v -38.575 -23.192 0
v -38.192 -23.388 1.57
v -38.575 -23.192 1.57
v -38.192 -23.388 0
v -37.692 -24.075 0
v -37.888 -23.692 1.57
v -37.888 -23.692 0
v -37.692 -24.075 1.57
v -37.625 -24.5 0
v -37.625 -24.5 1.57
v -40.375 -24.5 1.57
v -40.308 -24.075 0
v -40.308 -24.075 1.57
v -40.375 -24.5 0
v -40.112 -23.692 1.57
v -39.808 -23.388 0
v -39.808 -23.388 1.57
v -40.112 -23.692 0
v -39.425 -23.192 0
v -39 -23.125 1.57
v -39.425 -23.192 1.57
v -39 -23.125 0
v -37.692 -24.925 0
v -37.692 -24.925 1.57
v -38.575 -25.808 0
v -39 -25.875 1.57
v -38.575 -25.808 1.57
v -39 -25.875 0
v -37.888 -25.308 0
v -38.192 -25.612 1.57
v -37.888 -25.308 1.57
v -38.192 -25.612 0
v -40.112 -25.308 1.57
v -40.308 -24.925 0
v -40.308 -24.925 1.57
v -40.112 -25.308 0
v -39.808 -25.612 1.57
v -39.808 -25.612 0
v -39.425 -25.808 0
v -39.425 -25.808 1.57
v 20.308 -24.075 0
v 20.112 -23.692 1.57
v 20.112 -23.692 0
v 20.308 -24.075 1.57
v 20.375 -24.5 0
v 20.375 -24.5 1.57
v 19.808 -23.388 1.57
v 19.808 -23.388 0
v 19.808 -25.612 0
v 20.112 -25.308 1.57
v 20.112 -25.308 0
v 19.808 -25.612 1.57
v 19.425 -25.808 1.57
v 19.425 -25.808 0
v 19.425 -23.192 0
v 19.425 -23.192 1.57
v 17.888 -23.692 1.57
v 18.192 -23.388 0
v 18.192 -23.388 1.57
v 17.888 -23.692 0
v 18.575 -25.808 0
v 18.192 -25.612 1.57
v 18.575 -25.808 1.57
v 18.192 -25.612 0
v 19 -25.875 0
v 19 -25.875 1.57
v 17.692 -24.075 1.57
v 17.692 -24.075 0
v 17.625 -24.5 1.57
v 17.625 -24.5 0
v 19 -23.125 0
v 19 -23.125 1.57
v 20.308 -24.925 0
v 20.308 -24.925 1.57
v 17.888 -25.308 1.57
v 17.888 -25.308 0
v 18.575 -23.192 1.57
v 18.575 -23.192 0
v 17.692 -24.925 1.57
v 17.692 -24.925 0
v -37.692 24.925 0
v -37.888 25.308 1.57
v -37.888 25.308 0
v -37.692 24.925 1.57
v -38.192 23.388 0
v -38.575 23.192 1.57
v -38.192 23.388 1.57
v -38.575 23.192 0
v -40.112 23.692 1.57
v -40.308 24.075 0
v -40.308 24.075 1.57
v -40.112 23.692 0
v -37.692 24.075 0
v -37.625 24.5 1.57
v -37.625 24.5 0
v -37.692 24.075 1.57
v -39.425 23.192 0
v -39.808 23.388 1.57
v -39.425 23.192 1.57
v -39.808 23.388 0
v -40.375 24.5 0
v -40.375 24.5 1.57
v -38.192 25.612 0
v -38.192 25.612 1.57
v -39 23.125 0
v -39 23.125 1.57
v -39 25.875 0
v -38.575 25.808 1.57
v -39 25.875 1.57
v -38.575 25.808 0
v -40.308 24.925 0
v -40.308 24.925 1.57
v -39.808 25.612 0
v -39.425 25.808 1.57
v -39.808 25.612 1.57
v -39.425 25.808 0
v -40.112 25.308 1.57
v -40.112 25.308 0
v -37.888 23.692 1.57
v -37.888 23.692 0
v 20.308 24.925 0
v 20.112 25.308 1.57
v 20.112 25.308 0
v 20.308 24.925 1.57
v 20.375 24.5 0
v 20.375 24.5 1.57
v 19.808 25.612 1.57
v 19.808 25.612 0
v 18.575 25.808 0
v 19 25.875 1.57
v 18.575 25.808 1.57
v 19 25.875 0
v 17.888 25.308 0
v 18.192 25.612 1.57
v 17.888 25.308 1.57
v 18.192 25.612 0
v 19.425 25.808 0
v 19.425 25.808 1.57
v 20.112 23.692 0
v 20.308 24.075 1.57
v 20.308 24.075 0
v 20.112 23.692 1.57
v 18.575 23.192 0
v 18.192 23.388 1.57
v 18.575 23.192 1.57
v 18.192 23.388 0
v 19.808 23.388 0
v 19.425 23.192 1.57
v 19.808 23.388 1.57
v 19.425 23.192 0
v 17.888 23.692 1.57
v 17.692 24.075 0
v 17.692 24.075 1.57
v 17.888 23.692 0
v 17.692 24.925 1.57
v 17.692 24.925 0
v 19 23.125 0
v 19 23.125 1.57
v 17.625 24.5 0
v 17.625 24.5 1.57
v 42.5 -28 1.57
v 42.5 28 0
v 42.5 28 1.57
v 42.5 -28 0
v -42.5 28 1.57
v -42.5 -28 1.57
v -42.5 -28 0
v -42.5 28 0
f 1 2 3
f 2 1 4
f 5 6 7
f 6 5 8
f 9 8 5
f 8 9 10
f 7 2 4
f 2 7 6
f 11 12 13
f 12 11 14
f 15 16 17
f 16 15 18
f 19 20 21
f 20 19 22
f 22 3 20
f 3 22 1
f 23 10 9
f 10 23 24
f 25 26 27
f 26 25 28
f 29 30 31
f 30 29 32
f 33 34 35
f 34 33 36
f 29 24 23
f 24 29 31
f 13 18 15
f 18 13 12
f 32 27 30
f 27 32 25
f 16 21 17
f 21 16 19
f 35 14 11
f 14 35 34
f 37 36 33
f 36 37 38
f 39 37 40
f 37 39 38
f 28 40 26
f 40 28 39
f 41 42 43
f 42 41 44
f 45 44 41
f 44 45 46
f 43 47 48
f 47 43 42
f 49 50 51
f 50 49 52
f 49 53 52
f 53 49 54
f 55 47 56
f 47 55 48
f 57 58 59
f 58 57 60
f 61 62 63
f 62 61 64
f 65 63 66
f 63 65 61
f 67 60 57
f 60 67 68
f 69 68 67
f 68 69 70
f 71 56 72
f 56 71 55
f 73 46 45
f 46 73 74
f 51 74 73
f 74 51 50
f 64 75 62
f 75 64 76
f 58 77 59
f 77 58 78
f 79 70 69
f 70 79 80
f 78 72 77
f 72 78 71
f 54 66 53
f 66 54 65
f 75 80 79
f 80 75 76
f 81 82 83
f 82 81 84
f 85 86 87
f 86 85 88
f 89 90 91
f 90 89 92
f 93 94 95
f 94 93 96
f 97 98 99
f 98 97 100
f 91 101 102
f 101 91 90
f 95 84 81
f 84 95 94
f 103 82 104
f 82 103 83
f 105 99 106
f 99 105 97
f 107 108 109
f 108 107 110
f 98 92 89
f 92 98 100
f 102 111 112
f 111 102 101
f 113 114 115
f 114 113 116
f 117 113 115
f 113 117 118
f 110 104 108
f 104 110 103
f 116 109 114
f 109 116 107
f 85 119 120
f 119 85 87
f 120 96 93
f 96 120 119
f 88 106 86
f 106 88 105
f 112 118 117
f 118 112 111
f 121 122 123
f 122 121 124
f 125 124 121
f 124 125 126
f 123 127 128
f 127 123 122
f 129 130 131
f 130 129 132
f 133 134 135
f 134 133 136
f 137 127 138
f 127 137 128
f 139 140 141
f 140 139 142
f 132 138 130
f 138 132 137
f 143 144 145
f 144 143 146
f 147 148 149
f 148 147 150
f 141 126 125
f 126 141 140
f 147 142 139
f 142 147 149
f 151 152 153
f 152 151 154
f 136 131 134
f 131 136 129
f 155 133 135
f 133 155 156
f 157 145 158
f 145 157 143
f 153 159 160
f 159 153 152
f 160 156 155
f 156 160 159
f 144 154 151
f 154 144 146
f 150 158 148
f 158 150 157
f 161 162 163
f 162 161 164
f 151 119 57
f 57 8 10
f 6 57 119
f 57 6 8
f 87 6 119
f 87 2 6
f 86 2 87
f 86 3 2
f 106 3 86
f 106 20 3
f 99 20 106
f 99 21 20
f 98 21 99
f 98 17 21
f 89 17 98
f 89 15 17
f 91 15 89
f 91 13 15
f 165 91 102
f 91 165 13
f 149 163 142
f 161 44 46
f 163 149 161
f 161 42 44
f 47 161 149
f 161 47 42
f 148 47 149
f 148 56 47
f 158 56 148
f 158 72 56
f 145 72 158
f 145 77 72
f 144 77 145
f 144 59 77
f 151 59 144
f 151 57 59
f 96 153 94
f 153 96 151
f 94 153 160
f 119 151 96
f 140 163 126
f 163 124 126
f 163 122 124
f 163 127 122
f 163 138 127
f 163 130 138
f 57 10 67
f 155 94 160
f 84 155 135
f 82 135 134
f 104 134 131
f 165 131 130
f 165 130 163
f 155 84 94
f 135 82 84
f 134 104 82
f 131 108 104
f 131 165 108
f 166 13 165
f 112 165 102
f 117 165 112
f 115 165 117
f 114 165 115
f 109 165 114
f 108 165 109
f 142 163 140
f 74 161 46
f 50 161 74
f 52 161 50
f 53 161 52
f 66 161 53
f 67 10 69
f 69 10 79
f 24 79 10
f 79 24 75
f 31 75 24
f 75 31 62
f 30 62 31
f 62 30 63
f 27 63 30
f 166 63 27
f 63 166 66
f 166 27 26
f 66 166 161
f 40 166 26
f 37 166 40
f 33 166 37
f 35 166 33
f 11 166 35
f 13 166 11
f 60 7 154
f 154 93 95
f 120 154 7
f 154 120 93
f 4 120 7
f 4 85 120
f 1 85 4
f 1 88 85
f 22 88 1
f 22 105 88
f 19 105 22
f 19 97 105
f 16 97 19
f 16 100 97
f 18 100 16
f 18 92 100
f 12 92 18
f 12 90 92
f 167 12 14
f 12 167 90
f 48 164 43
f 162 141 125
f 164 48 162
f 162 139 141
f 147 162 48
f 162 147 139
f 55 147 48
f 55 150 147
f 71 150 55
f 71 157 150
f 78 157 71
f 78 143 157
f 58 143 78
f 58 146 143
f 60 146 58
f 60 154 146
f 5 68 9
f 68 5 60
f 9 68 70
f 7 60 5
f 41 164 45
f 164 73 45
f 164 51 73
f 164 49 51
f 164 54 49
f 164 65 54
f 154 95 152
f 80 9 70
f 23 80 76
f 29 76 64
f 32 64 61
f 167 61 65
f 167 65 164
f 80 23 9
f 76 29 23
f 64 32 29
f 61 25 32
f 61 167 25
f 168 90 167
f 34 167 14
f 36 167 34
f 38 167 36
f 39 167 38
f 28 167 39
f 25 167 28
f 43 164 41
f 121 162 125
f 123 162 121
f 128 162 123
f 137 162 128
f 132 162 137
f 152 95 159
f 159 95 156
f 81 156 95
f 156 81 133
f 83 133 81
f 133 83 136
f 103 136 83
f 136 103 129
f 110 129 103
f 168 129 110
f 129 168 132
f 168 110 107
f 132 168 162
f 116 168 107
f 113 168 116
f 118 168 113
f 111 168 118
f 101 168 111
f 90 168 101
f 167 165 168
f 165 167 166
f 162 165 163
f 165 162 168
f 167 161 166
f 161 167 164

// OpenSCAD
// file: ../utils/struct.scad
function get(config, key) = config[search([key], config)[0]][1];

function set(config, key, value) = [for (elem = config) if (elem[0] != key) elem, [key, value]];
    
function join(config1, config2) = [for (elem = config1) elem, for (elem = config2) elem];
// main file
use <../utils/struct.scad>

function Raspi_config() =
        let (
            pcb_height = 1.57,
            width = 85,
            height = 56,
            bore_diameter = 2.75,
            bore_spread_w = 58,
            bore_spread_h = 49
        ) [
            ["pcb_height", pcb_height],
            ["width", width],
            ["height", height],
            ["bore_diameter", bore_diameter],
            ["bore_spread_w", bore_spread_w],
            ["bore_spread_h", bore_spread_h]
        ];

module Raspi_BoreHoles(config) {
    width = get(config, "width");
    height = get(config, "height");

    bore_locations = [
        [
        -width/2 + 3.5, 
        -height/2 + 3.5, 
        0],[
        -width/2 + 3.5 + get(config, "bore_spread_w"), 
        -height/2 + 3.5,
        0],[
        -width/2 + 3.5, 
        -height/2 + 3.5 + get(config, "bore_spread_h"), 
        0],[
        -width/2 + 3.5 + get(config, "bore_spread_w"), 
        -height/2 + 3.5 + get(config, "bore_spread_h"), 
        0]
    ];

    for (l = bore_locations)
        translate(l)
        children();
}

module Raspi(config) {
    width = get(config, "width");
    height = get(config, "height");
    pcb_height = get(config, "pcb_height");
    
    difference() {
        translate([-width/2, -height/2, 0])
        cube([width, height, pcb_height]);
        
        translate([0, 0, -1])
        Raspi_BoreHoles(config)
        cylinder($fn=20, d = get(config, "bore_diameter"), h = 10);
    }
    
};

Raspi(Raspi_config());
